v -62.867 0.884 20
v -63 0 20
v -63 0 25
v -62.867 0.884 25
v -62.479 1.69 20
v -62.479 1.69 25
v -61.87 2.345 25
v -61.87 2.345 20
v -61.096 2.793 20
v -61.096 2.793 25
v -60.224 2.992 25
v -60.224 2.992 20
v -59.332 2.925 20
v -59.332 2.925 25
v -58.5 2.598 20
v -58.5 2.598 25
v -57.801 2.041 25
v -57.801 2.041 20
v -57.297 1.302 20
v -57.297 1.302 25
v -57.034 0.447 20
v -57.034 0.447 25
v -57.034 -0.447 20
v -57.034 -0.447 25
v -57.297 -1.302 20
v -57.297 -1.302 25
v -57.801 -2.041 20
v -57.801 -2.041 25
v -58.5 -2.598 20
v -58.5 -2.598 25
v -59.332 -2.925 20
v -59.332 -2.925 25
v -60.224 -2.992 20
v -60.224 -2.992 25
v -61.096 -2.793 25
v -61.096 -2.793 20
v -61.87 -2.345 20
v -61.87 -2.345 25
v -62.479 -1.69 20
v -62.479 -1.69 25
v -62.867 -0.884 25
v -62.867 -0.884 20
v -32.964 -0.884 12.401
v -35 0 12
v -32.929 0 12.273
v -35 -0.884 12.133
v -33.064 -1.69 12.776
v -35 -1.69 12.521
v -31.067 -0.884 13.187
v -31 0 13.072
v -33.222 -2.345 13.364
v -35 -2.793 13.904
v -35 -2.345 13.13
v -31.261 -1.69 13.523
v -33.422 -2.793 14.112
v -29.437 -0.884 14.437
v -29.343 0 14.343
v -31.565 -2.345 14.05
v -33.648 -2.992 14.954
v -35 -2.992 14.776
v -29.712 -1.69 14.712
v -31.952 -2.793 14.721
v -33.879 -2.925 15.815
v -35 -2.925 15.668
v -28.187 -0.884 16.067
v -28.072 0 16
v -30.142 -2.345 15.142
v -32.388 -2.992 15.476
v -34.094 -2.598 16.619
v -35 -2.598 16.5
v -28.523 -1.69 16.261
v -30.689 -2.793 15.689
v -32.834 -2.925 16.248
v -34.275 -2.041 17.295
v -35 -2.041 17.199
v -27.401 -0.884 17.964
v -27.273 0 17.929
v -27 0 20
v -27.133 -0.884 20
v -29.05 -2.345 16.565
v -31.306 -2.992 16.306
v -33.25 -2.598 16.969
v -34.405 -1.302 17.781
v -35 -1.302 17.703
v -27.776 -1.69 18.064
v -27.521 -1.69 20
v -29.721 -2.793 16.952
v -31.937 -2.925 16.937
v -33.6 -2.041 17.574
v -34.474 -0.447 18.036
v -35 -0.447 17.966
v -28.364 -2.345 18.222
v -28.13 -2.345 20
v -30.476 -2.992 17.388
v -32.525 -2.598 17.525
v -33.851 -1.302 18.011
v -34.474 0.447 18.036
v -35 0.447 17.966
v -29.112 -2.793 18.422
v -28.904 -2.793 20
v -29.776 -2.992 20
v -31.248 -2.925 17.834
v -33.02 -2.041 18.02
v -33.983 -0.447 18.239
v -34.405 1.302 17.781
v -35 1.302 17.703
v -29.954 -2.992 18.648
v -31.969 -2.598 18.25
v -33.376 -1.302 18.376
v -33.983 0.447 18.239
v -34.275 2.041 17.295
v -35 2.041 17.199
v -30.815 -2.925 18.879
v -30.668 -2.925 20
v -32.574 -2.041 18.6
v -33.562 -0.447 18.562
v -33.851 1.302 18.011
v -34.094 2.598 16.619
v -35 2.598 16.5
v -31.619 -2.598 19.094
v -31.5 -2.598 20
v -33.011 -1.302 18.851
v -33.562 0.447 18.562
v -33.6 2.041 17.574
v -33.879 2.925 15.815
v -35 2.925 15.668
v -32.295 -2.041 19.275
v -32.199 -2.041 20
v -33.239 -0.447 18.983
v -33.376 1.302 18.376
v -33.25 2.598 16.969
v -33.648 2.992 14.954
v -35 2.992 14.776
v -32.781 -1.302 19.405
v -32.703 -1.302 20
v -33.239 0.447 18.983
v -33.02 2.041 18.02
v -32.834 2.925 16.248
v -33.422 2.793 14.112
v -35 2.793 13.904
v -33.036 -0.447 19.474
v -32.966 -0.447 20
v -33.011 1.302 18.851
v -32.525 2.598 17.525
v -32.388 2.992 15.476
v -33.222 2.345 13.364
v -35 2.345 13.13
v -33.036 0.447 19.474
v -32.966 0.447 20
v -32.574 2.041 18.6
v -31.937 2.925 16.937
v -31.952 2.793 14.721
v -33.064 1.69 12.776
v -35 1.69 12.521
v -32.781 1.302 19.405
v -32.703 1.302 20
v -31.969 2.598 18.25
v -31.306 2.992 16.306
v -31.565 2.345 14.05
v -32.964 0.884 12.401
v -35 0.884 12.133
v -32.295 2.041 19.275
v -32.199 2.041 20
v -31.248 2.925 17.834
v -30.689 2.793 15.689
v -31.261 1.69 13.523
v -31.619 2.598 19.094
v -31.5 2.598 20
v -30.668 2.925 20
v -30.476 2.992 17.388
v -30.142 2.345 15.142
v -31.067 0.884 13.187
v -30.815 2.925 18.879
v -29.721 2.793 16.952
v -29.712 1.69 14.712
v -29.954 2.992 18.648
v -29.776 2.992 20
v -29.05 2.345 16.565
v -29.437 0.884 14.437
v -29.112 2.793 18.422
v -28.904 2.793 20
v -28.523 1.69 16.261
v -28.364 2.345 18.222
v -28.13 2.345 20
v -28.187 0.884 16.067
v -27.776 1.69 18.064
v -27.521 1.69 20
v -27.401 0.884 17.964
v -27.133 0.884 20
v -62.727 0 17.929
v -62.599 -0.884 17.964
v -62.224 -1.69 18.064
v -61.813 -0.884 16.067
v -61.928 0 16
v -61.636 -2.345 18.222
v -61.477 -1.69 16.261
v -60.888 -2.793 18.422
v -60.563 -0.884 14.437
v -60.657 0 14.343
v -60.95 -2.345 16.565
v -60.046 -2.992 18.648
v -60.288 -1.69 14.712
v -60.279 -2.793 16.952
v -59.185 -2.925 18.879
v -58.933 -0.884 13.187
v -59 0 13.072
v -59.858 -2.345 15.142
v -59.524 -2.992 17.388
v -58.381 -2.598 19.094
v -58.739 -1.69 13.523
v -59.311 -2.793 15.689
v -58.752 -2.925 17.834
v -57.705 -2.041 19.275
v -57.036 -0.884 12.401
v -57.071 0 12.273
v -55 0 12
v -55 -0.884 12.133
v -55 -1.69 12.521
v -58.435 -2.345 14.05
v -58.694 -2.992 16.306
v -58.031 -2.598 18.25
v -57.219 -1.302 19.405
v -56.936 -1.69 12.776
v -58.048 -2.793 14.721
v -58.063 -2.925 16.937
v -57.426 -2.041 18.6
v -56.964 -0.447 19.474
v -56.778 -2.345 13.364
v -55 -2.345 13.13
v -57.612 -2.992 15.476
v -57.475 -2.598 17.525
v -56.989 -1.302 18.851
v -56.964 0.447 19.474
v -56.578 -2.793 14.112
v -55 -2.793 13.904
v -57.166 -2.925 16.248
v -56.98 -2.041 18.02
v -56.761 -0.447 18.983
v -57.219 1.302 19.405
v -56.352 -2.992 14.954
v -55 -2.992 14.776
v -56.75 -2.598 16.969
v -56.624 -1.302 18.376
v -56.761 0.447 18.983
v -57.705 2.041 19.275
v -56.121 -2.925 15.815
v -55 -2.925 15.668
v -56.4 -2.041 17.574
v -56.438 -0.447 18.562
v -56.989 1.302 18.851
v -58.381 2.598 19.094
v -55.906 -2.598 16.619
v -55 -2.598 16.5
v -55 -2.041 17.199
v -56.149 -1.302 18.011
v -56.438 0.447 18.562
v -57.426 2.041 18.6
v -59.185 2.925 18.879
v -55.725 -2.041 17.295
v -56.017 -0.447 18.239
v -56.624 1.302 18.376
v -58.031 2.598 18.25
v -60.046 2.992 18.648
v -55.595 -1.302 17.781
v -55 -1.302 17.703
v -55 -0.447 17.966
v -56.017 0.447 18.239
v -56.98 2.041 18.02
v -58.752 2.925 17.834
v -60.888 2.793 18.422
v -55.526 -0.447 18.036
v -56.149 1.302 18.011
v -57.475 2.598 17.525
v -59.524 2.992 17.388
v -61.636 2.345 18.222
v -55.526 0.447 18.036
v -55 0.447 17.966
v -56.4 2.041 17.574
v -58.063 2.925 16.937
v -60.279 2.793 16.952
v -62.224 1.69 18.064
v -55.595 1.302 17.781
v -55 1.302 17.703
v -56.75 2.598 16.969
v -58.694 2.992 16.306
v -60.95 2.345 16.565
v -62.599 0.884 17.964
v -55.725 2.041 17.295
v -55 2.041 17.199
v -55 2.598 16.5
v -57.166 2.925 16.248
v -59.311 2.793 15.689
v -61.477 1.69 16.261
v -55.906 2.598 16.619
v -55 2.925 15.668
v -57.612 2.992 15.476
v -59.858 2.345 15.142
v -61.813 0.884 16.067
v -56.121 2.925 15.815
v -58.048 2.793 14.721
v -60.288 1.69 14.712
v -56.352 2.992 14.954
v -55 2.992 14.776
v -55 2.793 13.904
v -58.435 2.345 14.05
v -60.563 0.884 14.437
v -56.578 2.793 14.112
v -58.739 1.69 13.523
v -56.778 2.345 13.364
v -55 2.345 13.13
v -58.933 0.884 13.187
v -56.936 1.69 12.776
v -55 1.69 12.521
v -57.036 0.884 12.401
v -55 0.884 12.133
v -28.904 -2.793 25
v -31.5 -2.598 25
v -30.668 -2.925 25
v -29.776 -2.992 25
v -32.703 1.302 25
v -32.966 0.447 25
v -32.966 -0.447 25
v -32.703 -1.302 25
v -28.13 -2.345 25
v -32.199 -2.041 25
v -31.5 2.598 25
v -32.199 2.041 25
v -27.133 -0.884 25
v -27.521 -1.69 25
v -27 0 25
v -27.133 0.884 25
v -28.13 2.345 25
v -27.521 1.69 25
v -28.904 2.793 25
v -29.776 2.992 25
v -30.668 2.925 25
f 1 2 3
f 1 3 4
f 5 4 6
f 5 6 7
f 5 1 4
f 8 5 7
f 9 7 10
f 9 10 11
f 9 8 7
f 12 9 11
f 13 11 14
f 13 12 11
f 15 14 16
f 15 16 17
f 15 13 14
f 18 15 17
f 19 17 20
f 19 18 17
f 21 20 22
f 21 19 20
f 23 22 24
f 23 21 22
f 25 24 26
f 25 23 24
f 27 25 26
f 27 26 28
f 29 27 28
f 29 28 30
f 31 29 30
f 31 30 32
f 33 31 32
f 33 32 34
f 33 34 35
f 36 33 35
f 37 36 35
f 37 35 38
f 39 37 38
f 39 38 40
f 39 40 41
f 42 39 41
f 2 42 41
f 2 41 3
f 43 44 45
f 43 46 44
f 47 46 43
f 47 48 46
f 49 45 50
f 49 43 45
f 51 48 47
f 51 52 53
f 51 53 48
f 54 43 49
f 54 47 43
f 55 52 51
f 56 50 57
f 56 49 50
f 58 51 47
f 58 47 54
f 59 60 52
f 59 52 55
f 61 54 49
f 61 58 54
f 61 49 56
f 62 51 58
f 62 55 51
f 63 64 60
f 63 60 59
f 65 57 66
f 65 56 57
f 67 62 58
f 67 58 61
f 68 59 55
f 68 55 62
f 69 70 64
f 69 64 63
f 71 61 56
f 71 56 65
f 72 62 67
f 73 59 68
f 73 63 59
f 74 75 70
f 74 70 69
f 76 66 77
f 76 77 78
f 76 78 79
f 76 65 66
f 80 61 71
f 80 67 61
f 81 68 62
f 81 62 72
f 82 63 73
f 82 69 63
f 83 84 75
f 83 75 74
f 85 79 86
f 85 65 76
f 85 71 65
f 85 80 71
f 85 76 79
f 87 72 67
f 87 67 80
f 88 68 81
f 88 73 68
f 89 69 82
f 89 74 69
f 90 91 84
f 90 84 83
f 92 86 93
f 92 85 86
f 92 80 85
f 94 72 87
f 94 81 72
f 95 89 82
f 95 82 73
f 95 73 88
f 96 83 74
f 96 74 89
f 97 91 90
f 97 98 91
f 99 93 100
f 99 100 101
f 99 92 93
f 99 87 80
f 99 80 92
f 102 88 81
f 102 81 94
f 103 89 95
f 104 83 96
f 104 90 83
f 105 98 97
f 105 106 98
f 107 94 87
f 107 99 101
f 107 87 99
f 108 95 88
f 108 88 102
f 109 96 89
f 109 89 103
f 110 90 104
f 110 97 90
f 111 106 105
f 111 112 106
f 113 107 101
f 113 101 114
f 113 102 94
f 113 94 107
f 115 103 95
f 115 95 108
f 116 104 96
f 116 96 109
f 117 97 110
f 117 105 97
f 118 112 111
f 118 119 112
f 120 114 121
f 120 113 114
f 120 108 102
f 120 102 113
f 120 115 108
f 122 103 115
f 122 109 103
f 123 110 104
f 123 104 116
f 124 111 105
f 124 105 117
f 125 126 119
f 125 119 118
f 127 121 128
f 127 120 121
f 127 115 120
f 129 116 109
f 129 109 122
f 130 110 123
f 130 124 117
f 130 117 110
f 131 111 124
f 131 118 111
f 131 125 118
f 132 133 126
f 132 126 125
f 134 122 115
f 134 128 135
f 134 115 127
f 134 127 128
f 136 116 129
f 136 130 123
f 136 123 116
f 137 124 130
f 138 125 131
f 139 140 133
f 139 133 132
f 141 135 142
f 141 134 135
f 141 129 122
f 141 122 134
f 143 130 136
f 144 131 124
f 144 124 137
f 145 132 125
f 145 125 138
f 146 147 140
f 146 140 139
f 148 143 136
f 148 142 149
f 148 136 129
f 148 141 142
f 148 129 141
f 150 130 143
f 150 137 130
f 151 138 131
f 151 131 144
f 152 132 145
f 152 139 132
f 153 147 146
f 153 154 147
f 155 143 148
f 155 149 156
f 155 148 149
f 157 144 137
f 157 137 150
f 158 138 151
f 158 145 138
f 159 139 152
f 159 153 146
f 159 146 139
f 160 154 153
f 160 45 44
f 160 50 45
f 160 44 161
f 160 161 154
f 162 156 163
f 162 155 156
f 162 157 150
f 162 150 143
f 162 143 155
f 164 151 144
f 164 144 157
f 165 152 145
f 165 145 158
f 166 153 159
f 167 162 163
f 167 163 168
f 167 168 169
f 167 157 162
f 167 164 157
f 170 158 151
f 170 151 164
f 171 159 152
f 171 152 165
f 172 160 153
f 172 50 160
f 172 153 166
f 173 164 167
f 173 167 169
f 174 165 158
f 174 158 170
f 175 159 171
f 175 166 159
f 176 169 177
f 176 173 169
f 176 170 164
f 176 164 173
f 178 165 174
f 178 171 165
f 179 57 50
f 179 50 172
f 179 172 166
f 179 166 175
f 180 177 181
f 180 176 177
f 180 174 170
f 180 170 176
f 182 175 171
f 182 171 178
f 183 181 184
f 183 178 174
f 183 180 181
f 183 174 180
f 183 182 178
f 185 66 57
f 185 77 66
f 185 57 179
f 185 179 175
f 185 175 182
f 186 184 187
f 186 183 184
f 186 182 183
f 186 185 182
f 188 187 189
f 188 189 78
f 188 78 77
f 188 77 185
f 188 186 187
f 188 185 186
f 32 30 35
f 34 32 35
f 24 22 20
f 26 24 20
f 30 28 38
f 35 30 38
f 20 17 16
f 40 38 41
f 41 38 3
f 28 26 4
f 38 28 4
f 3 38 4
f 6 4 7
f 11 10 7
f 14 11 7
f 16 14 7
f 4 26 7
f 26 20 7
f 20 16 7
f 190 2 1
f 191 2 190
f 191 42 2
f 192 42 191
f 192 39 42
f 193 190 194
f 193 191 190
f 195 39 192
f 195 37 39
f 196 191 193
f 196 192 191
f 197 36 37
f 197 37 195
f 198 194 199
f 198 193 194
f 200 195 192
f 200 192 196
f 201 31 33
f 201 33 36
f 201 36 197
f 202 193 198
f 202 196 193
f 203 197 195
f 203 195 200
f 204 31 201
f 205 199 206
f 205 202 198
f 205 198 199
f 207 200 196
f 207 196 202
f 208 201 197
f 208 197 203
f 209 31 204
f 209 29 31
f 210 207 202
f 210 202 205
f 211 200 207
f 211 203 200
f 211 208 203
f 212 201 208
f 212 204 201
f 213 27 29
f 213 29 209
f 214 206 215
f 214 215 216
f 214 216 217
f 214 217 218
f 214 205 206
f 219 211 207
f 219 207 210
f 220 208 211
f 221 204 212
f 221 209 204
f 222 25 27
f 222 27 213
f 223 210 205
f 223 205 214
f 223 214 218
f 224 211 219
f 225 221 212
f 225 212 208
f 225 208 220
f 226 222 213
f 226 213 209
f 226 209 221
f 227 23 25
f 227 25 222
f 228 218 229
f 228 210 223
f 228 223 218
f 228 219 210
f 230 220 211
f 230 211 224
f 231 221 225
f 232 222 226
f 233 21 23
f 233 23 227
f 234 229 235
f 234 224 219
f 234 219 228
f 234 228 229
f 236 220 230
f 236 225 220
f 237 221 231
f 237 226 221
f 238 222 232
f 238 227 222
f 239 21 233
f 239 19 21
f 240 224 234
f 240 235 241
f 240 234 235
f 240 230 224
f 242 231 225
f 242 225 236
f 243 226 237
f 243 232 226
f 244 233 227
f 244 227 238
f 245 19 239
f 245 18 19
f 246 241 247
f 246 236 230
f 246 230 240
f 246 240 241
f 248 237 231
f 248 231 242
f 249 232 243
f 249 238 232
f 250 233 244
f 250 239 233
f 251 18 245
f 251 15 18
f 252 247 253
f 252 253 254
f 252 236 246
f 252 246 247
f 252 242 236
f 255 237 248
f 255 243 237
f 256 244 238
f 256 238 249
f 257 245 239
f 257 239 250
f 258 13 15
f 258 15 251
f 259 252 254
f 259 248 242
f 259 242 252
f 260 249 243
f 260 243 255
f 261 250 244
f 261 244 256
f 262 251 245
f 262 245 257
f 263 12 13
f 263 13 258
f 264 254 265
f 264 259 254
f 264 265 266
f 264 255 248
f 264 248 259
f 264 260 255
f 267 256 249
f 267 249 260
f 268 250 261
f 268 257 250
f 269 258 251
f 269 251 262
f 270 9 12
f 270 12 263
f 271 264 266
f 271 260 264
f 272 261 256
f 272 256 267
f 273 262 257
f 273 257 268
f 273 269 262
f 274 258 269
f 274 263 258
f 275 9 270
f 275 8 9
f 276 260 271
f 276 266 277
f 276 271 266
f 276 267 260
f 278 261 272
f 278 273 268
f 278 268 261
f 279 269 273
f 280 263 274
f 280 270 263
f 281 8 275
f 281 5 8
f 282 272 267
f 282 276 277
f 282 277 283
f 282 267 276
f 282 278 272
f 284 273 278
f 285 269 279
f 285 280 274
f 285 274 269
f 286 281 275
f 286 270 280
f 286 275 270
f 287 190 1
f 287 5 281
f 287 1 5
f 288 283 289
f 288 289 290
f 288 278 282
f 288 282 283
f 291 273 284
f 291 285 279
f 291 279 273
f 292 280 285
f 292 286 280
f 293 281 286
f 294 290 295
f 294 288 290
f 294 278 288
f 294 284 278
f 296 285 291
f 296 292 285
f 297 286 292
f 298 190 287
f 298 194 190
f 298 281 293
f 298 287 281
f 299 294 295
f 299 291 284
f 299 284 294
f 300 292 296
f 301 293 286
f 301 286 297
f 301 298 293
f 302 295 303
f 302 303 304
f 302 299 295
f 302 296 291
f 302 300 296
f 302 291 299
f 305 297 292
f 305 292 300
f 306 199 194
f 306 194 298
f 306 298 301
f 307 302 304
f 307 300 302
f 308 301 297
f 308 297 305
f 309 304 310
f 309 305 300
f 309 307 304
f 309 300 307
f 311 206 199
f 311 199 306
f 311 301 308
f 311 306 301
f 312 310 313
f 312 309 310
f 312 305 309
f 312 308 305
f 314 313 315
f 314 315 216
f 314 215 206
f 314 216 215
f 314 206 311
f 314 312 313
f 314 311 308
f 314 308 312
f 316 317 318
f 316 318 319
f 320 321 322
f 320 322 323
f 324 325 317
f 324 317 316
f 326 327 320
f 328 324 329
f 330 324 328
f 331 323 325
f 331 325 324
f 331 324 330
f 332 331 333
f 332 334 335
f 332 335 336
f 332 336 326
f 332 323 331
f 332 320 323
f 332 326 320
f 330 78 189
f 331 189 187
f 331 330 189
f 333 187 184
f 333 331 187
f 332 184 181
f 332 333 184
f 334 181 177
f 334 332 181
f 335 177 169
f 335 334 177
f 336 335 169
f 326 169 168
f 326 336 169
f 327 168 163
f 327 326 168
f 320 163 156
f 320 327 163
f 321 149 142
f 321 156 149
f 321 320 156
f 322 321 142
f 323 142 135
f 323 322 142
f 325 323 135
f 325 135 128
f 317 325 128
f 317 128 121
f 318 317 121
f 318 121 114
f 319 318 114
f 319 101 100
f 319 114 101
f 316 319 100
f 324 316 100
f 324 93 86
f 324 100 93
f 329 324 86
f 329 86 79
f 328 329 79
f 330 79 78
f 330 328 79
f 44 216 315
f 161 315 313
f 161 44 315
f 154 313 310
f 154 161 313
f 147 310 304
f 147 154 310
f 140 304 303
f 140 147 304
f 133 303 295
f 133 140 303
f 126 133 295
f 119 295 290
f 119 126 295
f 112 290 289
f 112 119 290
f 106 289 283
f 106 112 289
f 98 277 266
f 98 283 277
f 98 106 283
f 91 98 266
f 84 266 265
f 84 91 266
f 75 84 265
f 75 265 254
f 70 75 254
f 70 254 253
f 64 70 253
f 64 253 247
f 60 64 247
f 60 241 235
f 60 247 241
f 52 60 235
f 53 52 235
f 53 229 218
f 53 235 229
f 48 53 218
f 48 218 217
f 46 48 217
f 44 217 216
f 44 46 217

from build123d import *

# Parameters (mm, degrees)
SZKIC2_R = 3


with BuildPart() as part:
    # Wyciągnięcie po ścieżce1: sweep along a path in Szkic1
    with BuildLine(Plane(origin=(0, 0, 0), x_dir=(1, 0, 0), z_dir=(0, 1, 0))) as wyci_gni_cie_po_cie_ce1_path:
        Line((-60, -25), (-60, -20))
        ThreePointArc((-60, -20), (-58.535533906, -16.464466094), (-55, -15))
        Line((-55, -15), (-35, -15))
        ThreePointArc((-35, -15), (-31.464466094, -16.464466094), (-30, -20))
        Line((-30, -20), (-30, -25))
    # Szkic2 → Wyciągnięcie po ścieżce1 (sweep)
    with BuildSketch(Plane(origin=(-60, 0, 25), x_dir=(-1, 0, 0), z_dir=(0, 0, -1))):
        Circle(SZKIC2_R)
    sweep(path=wyci_gni_cie_po_cie_ce1_path.line)


solid = part.part
